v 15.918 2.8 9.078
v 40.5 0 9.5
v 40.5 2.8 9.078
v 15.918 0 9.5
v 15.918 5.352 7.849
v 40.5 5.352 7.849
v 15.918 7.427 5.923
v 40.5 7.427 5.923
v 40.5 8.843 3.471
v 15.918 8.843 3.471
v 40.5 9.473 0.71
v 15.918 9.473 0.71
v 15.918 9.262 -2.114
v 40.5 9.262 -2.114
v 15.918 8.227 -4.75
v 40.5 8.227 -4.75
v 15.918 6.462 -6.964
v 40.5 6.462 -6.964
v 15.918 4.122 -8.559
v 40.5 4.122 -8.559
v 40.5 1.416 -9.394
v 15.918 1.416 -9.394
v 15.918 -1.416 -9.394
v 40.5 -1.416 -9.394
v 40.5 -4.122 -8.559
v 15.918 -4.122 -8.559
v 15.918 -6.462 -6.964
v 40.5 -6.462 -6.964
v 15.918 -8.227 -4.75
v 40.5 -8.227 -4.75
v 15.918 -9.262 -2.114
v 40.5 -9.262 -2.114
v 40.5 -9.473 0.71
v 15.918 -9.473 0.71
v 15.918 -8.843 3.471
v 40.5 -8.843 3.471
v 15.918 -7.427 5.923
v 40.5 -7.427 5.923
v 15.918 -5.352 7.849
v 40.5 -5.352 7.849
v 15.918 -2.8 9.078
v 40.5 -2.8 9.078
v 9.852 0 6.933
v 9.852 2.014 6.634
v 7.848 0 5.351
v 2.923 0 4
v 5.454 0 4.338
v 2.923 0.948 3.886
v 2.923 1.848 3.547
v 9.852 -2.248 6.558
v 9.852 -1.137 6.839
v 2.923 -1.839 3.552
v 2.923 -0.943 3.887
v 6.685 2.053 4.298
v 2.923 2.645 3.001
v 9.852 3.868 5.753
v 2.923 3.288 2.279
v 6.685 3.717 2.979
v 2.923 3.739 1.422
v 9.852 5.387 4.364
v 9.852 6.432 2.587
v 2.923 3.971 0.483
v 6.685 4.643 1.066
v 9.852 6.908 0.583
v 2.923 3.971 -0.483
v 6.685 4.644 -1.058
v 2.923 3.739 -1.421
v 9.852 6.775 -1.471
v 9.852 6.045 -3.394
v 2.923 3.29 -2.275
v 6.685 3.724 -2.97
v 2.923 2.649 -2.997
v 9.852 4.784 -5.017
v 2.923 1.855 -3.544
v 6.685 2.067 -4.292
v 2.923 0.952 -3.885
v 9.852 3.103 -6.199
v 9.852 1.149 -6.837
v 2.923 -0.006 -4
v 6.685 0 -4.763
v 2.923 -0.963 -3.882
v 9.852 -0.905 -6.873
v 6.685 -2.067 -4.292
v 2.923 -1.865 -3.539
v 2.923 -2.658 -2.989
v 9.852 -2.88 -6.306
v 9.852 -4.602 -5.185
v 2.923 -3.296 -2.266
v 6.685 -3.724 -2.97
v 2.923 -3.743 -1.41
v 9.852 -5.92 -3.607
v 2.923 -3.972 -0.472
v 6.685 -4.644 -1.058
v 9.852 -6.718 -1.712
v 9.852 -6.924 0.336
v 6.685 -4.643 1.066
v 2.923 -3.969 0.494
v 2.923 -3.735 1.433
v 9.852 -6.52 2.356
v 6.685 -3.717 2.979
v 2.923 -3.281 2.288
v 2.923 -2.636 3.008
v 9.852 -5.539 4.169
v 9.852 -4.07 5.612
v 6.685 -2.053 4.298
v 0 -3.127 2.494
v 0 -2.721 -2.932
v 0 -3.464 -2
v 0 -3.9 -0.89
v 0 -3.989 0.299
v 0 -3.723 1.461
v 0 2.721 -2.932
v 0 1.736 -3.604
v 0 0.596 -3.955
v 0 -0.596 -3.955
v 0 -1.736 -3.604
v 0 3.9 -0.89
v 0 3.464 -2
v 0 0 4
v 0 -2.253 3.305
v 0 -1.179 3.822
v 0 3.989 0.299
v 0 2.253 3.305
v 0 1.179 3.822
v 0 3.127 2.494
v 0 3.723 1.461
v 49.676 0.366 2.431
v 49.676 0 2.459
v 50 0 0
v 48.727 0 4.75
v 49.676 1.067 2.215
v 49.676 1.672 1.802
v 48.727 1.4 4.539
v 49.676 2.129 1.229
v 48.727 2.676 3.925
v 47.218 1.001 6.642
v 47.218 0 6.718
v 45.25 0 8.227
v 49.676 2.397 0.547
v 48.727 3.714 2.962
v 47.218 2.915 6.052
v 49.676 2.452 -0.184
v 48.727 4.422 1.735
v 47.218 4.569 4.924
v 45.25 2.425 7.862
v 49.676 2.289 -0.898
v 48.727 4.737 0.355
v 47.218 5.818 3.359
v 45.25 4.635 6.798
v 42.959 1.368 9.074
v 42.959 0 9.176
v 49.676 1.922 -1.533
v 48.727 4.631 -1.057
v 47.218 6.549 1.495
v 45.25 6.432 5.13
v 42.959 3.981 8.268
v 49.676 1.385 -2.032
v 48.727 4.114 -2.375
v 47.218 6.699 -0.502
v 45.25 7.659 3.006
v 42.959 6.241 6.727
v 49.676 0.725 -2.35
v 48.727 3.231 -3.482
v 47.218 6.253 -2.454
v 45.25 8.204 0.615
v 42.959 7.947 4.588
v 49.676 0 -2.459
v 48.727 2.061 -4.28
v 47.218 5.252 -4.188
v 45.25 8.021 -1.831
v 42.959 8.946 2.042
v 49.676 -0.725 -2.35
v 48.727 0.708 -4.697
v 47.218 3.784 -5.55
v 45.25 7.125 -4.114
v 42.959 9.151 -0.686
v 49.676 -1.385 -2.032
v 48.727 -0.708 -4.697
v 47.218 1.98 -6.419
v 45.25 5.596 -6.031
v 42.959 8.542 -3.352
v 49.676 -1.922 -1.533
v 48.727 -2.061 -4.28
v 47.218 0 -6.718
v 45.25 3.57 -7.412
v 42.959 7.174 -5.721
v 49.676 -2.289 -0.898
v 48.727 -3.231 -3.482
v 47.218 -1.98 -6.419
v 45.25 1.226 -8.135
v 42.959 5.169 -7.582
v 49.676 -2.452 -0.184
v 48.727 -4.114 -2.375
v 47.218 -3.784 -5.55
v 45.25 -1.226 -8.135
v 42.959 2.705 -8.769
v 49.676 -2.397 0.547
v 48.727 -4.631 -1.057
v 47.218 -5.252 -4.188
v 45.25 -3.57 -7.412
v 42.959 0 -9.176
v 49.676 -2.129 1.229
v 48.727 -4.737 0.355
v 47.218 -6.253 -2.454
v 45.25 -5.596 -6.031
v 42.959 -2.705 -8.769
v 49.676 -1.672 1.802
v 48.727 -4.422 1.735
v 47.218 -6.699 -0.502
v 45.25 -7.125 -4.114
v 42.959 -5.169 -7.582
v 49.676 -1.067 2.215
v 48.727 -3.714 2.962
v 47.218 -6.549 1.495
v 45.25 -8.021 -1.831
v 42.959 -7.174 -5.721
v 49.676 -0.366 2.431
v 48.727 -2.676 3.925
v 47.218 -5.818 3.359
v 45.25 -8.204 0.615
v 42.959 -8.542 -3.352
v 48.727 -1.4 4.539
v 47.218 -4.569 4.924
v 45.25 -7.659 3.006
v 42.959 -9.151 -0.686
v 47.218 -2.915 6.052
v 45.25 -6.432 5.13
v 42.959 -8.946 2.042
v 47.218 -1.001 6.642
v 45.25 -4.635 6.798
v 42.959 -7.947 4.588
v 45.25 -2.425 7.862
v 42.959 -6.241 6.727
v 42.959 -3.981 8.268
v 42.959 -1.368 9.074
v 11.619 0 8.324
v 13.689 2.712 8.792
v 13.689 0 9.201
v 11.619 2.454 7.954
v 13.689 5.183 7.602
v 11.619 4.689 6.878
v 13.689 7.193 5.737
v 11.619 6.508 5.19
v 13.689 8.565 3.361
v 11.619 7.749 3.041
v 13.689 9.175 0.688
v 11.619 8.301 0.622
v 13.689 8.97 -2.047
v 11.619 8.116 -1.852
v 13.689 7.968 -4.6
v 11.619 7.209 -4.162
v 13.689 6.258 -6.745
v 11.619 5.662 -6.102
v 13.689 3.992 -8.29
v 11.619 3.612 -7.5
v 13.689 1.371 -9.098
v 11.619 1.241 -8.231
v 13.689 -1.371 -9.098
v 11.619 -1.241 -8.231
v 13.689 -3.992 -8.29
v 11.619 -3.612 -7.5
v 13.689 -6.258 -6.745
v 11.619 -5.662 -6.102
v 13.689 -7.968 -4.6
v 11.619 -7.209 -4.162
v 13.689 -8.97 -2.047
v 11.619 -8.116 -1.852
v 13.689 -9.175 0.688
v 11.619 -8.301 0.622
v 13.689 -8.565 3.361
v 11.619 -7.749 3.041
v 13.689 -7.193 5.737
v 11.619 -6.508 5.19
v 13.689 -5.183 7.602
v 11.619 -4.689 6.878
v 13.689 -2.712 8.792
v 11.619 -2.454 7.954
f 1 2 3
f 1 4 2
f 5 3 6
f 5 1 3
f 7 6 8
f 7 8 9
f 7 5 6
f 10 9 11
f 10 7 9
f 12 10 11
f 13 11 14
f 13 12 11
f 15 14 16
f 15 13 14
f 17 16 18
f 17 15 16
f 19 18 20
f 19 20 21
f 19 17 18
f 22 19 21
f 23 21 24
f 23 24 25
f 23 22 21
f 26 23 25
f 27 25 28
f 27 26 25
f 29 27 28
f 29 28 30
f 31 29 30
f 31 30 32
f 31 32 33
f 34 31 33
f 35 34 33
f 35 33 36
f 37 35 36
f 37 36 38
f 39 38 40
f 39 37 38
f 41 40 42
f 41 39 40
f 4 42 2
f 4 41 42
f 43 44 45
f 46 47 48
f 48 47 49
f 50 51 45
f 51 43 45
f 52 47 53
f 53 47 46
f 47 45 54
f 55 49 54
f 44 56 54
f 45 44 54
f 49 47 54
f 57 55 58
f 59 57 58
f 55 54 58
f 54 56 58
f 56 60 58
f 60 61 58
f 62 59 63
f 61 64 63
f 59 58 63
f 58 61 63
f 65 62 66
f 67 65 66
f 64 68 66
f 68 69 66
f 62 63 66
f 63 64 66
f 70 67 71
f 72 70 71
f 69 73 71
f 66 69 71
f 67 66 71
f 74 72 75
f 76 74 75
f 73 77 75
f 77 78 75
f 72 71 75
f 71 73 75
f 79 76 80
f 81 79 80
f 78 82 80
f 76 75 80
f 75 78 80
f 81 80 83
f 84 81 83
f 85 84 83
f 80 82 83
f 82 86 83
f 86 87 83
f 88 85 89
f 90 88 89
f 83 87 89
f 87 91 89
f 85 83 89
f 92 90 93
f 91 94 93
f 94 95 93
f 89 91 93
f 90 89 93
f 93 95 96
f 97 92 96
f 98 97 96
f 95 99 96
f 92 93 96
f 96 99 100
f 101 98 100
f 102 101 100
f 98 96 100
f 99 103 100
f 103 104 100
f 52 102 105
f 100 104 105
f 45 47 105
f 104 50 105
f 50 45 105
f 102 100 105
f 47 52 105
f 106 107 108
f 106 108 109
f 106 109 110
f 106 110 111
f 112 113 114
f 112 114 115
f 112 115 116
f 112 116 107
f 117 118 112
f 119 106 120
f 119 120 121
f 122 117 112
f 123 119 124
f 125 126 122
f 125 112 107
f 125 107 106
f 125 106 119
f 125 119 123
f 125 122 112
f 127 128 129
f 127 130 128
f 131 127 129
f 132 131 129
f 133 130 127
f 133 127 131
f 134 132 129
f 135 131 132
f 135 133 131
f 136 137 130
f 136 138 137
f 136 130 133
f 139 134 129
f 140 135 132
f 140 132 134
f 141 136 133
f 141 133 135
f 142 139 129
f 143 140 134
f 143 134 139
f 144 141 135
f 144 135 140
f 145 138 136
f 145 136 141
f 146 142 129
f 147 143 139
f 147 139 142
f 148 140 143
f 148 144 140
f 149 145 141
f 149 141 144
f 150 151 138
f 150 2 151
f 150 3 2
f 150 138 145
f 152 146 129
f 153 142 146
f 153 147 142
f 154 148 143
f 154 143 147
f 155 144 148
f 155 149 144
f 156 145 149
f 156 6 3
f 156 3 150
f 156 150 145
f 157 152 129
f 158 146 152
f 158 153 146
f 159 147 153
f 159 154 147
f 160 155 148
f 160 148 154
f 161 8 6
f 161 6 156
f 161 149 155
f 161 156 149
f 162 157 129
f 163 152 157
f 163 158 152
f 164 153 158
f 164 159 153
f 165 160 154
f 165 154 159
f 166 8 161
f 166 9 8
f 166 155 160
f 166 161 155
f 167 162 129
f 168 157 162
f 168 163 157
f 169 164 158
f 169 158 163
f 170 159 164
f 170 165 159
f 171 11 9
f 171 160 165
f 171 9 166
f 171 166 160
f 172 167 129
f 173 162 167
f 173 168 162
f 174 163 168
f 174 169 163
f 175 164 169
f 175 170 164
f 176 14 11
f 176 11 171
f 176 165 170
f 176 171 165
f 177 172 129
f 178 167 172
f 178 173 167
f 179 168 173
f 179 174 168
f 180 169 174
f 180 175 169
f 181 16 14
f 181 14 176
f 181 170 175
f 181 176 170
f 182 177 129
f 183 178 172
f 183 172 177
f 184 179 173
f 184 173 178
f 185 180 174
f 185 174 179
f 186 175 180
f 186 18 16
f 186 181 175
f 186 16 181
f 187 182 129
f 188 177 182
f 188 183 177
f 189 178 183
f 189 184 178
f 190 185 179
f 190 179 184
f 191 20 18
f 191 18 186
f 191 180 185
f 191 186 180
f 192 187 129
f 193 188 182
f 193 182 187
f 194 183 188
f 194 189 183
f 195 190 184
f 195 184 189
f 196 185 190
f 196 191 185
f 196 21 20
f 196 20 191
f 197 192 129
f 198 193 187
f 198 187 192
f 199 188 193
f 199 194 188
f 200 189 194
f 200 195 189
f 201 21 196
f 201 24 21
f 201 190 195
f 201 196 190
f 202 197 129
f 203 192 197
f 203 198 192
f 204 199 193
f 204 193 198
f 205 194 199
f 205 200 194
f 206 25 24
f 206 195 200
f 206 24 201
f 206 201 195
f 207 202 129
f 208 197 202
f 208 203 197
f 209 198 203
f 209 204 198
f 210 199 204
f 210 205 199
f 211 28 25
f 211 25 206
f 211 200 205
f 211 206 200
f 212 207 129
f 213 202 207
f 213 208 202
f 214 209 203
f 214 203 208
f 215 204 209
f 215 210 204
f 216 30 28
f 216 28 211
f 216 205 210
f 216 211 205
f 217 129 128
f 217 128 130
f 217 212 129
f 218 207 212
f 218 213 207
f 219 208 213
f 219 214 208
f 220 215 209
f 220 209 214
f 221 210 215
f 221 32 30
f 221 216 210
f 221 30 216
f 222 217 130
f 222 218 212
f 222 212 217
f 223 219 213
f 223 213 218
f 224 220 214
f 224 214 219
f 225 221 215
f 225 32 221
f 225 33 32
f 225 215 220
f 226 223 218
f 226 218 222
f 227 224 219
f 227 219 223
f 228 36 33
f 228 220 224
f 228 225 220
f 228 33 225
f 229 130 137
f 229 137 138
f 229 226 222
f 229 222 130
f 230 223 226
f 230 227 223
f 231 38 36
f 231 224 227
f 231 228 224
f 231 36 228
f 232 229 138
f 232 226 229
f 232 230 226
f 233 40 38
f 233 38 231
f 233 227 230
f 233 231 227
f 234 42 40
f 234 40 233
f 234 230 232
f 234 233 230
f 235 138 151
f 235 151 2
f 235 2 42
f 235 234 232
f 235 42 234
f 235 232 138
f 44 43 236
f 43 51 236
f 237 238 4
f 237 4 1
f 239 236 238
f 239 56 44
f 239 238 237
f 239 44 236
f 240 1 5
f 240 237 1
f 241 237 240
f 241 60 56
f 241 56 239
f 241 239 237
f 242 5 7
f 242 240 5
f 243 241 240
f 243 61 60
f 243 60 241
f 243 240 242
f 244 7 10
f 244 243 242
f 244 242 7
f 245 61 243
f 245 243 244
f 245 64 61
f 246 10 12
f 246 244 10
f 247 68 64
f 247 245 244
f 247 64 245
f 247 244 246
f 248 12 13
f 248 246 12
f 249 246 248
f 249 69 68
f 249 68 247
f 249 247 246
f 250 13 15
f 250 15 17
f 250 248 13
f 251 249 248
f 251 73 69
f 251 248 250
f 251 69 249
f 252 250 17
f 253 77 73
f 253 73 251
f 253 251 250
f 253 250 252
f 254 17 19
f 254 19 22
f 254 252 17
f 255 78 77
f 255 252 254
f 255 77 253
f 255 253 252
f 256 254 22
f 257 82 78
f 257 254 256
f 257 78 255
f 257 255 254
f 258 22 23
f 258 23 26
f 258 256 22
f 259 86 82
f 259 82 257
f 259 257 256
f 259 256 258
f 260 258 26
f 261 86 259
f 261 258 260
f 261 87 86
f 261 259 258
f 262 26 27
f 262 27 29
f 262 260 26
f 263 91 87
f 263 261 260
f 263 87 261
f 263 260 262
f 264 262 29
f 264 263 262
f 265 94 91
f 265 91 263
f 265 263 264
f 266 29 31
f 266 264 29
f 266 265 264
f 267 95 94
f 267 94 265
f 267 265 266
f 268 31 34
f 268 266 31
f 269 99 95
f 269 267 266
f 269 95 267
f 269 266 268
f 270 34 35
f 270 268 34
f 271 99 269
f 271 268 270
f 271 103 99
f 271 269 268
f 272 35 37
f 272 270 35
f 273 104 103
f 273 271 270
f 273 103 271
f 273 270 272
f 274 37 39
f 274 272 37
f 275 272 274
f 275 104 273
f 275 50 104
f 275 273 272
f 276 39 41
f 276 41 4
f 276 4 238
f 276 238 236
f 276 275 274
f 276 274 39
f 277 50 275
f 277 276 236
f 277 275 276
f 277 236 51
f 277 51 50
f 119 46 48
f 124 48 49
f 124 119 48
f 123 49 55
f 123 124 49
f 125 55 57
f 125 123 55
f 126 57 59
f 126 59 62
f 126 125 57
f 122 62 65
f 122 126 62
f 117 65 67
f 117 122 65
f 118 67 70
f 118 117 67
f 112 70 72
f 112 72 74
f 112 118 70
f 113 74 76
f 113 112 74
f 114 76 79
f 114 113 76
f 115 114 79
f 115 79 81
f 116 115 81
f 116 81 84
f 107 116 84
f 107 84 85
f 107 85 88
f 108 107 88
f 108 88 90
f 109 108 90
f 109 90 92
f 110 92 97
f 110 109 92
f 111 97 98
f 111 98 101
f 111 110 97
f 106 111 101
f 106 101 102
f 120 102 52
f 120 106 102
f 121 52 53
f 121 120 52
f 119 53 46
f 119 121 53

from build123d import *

# Parameters (mm, degrees)
F2_R = 9.5
F4_R = 9.6520512263


# Not quite as in the source:
# - a fillet or chamfer that OpenCascade refuses, or shapes differently, is made with other operations: its cross-section is extruded or revolved along the edge and cut away or added


with BuildPart() as f1:
    # F0 (on Front) → F1 (revolve)
    with BuildSketch(Plane.XZ):
        Polygon((0, 4), (0, 0), (50, 0), (50, 9.5), (8, 9.5), (8, 4), align=None)
    revolve(axis=Axis((25, 0, 0), (-1, 0, 0)))

    # F2
    f2_edges = [f1.edges().sort_by_distance(p)[0] for p in [
        (50, 0, -9.5),
    ]]
    fillet(f2_edges, radius=F2_R)

    # F3: fillet of radius 8.4497474683 on 1 edges, made by hand

    # F3_s1 → F3_t2 (revolve, cut)
    with BuildSketch(Plane.XZ):
        with BuildLine():
            ThreePointArc((15.9181577498, 9.5), (11.0977007655, 7.990095955), (8, 4))
            Line((8, 4), (8, 9.5))
            Line((8, 9.5), (15.9181577498, 9.5))
        make_face()
    revolve(axis=Axis((8, 0, 0), (-1, 0, 0)), mode=Mode.SUBTRACT)

    # F4
    f4_edges = [f1.edges().sort_by_distance(p)[0] for p in [
        (8, 0, -4),
    ]]
    fillet(f4_edges, radius=F4_R)


solid = f1.part
